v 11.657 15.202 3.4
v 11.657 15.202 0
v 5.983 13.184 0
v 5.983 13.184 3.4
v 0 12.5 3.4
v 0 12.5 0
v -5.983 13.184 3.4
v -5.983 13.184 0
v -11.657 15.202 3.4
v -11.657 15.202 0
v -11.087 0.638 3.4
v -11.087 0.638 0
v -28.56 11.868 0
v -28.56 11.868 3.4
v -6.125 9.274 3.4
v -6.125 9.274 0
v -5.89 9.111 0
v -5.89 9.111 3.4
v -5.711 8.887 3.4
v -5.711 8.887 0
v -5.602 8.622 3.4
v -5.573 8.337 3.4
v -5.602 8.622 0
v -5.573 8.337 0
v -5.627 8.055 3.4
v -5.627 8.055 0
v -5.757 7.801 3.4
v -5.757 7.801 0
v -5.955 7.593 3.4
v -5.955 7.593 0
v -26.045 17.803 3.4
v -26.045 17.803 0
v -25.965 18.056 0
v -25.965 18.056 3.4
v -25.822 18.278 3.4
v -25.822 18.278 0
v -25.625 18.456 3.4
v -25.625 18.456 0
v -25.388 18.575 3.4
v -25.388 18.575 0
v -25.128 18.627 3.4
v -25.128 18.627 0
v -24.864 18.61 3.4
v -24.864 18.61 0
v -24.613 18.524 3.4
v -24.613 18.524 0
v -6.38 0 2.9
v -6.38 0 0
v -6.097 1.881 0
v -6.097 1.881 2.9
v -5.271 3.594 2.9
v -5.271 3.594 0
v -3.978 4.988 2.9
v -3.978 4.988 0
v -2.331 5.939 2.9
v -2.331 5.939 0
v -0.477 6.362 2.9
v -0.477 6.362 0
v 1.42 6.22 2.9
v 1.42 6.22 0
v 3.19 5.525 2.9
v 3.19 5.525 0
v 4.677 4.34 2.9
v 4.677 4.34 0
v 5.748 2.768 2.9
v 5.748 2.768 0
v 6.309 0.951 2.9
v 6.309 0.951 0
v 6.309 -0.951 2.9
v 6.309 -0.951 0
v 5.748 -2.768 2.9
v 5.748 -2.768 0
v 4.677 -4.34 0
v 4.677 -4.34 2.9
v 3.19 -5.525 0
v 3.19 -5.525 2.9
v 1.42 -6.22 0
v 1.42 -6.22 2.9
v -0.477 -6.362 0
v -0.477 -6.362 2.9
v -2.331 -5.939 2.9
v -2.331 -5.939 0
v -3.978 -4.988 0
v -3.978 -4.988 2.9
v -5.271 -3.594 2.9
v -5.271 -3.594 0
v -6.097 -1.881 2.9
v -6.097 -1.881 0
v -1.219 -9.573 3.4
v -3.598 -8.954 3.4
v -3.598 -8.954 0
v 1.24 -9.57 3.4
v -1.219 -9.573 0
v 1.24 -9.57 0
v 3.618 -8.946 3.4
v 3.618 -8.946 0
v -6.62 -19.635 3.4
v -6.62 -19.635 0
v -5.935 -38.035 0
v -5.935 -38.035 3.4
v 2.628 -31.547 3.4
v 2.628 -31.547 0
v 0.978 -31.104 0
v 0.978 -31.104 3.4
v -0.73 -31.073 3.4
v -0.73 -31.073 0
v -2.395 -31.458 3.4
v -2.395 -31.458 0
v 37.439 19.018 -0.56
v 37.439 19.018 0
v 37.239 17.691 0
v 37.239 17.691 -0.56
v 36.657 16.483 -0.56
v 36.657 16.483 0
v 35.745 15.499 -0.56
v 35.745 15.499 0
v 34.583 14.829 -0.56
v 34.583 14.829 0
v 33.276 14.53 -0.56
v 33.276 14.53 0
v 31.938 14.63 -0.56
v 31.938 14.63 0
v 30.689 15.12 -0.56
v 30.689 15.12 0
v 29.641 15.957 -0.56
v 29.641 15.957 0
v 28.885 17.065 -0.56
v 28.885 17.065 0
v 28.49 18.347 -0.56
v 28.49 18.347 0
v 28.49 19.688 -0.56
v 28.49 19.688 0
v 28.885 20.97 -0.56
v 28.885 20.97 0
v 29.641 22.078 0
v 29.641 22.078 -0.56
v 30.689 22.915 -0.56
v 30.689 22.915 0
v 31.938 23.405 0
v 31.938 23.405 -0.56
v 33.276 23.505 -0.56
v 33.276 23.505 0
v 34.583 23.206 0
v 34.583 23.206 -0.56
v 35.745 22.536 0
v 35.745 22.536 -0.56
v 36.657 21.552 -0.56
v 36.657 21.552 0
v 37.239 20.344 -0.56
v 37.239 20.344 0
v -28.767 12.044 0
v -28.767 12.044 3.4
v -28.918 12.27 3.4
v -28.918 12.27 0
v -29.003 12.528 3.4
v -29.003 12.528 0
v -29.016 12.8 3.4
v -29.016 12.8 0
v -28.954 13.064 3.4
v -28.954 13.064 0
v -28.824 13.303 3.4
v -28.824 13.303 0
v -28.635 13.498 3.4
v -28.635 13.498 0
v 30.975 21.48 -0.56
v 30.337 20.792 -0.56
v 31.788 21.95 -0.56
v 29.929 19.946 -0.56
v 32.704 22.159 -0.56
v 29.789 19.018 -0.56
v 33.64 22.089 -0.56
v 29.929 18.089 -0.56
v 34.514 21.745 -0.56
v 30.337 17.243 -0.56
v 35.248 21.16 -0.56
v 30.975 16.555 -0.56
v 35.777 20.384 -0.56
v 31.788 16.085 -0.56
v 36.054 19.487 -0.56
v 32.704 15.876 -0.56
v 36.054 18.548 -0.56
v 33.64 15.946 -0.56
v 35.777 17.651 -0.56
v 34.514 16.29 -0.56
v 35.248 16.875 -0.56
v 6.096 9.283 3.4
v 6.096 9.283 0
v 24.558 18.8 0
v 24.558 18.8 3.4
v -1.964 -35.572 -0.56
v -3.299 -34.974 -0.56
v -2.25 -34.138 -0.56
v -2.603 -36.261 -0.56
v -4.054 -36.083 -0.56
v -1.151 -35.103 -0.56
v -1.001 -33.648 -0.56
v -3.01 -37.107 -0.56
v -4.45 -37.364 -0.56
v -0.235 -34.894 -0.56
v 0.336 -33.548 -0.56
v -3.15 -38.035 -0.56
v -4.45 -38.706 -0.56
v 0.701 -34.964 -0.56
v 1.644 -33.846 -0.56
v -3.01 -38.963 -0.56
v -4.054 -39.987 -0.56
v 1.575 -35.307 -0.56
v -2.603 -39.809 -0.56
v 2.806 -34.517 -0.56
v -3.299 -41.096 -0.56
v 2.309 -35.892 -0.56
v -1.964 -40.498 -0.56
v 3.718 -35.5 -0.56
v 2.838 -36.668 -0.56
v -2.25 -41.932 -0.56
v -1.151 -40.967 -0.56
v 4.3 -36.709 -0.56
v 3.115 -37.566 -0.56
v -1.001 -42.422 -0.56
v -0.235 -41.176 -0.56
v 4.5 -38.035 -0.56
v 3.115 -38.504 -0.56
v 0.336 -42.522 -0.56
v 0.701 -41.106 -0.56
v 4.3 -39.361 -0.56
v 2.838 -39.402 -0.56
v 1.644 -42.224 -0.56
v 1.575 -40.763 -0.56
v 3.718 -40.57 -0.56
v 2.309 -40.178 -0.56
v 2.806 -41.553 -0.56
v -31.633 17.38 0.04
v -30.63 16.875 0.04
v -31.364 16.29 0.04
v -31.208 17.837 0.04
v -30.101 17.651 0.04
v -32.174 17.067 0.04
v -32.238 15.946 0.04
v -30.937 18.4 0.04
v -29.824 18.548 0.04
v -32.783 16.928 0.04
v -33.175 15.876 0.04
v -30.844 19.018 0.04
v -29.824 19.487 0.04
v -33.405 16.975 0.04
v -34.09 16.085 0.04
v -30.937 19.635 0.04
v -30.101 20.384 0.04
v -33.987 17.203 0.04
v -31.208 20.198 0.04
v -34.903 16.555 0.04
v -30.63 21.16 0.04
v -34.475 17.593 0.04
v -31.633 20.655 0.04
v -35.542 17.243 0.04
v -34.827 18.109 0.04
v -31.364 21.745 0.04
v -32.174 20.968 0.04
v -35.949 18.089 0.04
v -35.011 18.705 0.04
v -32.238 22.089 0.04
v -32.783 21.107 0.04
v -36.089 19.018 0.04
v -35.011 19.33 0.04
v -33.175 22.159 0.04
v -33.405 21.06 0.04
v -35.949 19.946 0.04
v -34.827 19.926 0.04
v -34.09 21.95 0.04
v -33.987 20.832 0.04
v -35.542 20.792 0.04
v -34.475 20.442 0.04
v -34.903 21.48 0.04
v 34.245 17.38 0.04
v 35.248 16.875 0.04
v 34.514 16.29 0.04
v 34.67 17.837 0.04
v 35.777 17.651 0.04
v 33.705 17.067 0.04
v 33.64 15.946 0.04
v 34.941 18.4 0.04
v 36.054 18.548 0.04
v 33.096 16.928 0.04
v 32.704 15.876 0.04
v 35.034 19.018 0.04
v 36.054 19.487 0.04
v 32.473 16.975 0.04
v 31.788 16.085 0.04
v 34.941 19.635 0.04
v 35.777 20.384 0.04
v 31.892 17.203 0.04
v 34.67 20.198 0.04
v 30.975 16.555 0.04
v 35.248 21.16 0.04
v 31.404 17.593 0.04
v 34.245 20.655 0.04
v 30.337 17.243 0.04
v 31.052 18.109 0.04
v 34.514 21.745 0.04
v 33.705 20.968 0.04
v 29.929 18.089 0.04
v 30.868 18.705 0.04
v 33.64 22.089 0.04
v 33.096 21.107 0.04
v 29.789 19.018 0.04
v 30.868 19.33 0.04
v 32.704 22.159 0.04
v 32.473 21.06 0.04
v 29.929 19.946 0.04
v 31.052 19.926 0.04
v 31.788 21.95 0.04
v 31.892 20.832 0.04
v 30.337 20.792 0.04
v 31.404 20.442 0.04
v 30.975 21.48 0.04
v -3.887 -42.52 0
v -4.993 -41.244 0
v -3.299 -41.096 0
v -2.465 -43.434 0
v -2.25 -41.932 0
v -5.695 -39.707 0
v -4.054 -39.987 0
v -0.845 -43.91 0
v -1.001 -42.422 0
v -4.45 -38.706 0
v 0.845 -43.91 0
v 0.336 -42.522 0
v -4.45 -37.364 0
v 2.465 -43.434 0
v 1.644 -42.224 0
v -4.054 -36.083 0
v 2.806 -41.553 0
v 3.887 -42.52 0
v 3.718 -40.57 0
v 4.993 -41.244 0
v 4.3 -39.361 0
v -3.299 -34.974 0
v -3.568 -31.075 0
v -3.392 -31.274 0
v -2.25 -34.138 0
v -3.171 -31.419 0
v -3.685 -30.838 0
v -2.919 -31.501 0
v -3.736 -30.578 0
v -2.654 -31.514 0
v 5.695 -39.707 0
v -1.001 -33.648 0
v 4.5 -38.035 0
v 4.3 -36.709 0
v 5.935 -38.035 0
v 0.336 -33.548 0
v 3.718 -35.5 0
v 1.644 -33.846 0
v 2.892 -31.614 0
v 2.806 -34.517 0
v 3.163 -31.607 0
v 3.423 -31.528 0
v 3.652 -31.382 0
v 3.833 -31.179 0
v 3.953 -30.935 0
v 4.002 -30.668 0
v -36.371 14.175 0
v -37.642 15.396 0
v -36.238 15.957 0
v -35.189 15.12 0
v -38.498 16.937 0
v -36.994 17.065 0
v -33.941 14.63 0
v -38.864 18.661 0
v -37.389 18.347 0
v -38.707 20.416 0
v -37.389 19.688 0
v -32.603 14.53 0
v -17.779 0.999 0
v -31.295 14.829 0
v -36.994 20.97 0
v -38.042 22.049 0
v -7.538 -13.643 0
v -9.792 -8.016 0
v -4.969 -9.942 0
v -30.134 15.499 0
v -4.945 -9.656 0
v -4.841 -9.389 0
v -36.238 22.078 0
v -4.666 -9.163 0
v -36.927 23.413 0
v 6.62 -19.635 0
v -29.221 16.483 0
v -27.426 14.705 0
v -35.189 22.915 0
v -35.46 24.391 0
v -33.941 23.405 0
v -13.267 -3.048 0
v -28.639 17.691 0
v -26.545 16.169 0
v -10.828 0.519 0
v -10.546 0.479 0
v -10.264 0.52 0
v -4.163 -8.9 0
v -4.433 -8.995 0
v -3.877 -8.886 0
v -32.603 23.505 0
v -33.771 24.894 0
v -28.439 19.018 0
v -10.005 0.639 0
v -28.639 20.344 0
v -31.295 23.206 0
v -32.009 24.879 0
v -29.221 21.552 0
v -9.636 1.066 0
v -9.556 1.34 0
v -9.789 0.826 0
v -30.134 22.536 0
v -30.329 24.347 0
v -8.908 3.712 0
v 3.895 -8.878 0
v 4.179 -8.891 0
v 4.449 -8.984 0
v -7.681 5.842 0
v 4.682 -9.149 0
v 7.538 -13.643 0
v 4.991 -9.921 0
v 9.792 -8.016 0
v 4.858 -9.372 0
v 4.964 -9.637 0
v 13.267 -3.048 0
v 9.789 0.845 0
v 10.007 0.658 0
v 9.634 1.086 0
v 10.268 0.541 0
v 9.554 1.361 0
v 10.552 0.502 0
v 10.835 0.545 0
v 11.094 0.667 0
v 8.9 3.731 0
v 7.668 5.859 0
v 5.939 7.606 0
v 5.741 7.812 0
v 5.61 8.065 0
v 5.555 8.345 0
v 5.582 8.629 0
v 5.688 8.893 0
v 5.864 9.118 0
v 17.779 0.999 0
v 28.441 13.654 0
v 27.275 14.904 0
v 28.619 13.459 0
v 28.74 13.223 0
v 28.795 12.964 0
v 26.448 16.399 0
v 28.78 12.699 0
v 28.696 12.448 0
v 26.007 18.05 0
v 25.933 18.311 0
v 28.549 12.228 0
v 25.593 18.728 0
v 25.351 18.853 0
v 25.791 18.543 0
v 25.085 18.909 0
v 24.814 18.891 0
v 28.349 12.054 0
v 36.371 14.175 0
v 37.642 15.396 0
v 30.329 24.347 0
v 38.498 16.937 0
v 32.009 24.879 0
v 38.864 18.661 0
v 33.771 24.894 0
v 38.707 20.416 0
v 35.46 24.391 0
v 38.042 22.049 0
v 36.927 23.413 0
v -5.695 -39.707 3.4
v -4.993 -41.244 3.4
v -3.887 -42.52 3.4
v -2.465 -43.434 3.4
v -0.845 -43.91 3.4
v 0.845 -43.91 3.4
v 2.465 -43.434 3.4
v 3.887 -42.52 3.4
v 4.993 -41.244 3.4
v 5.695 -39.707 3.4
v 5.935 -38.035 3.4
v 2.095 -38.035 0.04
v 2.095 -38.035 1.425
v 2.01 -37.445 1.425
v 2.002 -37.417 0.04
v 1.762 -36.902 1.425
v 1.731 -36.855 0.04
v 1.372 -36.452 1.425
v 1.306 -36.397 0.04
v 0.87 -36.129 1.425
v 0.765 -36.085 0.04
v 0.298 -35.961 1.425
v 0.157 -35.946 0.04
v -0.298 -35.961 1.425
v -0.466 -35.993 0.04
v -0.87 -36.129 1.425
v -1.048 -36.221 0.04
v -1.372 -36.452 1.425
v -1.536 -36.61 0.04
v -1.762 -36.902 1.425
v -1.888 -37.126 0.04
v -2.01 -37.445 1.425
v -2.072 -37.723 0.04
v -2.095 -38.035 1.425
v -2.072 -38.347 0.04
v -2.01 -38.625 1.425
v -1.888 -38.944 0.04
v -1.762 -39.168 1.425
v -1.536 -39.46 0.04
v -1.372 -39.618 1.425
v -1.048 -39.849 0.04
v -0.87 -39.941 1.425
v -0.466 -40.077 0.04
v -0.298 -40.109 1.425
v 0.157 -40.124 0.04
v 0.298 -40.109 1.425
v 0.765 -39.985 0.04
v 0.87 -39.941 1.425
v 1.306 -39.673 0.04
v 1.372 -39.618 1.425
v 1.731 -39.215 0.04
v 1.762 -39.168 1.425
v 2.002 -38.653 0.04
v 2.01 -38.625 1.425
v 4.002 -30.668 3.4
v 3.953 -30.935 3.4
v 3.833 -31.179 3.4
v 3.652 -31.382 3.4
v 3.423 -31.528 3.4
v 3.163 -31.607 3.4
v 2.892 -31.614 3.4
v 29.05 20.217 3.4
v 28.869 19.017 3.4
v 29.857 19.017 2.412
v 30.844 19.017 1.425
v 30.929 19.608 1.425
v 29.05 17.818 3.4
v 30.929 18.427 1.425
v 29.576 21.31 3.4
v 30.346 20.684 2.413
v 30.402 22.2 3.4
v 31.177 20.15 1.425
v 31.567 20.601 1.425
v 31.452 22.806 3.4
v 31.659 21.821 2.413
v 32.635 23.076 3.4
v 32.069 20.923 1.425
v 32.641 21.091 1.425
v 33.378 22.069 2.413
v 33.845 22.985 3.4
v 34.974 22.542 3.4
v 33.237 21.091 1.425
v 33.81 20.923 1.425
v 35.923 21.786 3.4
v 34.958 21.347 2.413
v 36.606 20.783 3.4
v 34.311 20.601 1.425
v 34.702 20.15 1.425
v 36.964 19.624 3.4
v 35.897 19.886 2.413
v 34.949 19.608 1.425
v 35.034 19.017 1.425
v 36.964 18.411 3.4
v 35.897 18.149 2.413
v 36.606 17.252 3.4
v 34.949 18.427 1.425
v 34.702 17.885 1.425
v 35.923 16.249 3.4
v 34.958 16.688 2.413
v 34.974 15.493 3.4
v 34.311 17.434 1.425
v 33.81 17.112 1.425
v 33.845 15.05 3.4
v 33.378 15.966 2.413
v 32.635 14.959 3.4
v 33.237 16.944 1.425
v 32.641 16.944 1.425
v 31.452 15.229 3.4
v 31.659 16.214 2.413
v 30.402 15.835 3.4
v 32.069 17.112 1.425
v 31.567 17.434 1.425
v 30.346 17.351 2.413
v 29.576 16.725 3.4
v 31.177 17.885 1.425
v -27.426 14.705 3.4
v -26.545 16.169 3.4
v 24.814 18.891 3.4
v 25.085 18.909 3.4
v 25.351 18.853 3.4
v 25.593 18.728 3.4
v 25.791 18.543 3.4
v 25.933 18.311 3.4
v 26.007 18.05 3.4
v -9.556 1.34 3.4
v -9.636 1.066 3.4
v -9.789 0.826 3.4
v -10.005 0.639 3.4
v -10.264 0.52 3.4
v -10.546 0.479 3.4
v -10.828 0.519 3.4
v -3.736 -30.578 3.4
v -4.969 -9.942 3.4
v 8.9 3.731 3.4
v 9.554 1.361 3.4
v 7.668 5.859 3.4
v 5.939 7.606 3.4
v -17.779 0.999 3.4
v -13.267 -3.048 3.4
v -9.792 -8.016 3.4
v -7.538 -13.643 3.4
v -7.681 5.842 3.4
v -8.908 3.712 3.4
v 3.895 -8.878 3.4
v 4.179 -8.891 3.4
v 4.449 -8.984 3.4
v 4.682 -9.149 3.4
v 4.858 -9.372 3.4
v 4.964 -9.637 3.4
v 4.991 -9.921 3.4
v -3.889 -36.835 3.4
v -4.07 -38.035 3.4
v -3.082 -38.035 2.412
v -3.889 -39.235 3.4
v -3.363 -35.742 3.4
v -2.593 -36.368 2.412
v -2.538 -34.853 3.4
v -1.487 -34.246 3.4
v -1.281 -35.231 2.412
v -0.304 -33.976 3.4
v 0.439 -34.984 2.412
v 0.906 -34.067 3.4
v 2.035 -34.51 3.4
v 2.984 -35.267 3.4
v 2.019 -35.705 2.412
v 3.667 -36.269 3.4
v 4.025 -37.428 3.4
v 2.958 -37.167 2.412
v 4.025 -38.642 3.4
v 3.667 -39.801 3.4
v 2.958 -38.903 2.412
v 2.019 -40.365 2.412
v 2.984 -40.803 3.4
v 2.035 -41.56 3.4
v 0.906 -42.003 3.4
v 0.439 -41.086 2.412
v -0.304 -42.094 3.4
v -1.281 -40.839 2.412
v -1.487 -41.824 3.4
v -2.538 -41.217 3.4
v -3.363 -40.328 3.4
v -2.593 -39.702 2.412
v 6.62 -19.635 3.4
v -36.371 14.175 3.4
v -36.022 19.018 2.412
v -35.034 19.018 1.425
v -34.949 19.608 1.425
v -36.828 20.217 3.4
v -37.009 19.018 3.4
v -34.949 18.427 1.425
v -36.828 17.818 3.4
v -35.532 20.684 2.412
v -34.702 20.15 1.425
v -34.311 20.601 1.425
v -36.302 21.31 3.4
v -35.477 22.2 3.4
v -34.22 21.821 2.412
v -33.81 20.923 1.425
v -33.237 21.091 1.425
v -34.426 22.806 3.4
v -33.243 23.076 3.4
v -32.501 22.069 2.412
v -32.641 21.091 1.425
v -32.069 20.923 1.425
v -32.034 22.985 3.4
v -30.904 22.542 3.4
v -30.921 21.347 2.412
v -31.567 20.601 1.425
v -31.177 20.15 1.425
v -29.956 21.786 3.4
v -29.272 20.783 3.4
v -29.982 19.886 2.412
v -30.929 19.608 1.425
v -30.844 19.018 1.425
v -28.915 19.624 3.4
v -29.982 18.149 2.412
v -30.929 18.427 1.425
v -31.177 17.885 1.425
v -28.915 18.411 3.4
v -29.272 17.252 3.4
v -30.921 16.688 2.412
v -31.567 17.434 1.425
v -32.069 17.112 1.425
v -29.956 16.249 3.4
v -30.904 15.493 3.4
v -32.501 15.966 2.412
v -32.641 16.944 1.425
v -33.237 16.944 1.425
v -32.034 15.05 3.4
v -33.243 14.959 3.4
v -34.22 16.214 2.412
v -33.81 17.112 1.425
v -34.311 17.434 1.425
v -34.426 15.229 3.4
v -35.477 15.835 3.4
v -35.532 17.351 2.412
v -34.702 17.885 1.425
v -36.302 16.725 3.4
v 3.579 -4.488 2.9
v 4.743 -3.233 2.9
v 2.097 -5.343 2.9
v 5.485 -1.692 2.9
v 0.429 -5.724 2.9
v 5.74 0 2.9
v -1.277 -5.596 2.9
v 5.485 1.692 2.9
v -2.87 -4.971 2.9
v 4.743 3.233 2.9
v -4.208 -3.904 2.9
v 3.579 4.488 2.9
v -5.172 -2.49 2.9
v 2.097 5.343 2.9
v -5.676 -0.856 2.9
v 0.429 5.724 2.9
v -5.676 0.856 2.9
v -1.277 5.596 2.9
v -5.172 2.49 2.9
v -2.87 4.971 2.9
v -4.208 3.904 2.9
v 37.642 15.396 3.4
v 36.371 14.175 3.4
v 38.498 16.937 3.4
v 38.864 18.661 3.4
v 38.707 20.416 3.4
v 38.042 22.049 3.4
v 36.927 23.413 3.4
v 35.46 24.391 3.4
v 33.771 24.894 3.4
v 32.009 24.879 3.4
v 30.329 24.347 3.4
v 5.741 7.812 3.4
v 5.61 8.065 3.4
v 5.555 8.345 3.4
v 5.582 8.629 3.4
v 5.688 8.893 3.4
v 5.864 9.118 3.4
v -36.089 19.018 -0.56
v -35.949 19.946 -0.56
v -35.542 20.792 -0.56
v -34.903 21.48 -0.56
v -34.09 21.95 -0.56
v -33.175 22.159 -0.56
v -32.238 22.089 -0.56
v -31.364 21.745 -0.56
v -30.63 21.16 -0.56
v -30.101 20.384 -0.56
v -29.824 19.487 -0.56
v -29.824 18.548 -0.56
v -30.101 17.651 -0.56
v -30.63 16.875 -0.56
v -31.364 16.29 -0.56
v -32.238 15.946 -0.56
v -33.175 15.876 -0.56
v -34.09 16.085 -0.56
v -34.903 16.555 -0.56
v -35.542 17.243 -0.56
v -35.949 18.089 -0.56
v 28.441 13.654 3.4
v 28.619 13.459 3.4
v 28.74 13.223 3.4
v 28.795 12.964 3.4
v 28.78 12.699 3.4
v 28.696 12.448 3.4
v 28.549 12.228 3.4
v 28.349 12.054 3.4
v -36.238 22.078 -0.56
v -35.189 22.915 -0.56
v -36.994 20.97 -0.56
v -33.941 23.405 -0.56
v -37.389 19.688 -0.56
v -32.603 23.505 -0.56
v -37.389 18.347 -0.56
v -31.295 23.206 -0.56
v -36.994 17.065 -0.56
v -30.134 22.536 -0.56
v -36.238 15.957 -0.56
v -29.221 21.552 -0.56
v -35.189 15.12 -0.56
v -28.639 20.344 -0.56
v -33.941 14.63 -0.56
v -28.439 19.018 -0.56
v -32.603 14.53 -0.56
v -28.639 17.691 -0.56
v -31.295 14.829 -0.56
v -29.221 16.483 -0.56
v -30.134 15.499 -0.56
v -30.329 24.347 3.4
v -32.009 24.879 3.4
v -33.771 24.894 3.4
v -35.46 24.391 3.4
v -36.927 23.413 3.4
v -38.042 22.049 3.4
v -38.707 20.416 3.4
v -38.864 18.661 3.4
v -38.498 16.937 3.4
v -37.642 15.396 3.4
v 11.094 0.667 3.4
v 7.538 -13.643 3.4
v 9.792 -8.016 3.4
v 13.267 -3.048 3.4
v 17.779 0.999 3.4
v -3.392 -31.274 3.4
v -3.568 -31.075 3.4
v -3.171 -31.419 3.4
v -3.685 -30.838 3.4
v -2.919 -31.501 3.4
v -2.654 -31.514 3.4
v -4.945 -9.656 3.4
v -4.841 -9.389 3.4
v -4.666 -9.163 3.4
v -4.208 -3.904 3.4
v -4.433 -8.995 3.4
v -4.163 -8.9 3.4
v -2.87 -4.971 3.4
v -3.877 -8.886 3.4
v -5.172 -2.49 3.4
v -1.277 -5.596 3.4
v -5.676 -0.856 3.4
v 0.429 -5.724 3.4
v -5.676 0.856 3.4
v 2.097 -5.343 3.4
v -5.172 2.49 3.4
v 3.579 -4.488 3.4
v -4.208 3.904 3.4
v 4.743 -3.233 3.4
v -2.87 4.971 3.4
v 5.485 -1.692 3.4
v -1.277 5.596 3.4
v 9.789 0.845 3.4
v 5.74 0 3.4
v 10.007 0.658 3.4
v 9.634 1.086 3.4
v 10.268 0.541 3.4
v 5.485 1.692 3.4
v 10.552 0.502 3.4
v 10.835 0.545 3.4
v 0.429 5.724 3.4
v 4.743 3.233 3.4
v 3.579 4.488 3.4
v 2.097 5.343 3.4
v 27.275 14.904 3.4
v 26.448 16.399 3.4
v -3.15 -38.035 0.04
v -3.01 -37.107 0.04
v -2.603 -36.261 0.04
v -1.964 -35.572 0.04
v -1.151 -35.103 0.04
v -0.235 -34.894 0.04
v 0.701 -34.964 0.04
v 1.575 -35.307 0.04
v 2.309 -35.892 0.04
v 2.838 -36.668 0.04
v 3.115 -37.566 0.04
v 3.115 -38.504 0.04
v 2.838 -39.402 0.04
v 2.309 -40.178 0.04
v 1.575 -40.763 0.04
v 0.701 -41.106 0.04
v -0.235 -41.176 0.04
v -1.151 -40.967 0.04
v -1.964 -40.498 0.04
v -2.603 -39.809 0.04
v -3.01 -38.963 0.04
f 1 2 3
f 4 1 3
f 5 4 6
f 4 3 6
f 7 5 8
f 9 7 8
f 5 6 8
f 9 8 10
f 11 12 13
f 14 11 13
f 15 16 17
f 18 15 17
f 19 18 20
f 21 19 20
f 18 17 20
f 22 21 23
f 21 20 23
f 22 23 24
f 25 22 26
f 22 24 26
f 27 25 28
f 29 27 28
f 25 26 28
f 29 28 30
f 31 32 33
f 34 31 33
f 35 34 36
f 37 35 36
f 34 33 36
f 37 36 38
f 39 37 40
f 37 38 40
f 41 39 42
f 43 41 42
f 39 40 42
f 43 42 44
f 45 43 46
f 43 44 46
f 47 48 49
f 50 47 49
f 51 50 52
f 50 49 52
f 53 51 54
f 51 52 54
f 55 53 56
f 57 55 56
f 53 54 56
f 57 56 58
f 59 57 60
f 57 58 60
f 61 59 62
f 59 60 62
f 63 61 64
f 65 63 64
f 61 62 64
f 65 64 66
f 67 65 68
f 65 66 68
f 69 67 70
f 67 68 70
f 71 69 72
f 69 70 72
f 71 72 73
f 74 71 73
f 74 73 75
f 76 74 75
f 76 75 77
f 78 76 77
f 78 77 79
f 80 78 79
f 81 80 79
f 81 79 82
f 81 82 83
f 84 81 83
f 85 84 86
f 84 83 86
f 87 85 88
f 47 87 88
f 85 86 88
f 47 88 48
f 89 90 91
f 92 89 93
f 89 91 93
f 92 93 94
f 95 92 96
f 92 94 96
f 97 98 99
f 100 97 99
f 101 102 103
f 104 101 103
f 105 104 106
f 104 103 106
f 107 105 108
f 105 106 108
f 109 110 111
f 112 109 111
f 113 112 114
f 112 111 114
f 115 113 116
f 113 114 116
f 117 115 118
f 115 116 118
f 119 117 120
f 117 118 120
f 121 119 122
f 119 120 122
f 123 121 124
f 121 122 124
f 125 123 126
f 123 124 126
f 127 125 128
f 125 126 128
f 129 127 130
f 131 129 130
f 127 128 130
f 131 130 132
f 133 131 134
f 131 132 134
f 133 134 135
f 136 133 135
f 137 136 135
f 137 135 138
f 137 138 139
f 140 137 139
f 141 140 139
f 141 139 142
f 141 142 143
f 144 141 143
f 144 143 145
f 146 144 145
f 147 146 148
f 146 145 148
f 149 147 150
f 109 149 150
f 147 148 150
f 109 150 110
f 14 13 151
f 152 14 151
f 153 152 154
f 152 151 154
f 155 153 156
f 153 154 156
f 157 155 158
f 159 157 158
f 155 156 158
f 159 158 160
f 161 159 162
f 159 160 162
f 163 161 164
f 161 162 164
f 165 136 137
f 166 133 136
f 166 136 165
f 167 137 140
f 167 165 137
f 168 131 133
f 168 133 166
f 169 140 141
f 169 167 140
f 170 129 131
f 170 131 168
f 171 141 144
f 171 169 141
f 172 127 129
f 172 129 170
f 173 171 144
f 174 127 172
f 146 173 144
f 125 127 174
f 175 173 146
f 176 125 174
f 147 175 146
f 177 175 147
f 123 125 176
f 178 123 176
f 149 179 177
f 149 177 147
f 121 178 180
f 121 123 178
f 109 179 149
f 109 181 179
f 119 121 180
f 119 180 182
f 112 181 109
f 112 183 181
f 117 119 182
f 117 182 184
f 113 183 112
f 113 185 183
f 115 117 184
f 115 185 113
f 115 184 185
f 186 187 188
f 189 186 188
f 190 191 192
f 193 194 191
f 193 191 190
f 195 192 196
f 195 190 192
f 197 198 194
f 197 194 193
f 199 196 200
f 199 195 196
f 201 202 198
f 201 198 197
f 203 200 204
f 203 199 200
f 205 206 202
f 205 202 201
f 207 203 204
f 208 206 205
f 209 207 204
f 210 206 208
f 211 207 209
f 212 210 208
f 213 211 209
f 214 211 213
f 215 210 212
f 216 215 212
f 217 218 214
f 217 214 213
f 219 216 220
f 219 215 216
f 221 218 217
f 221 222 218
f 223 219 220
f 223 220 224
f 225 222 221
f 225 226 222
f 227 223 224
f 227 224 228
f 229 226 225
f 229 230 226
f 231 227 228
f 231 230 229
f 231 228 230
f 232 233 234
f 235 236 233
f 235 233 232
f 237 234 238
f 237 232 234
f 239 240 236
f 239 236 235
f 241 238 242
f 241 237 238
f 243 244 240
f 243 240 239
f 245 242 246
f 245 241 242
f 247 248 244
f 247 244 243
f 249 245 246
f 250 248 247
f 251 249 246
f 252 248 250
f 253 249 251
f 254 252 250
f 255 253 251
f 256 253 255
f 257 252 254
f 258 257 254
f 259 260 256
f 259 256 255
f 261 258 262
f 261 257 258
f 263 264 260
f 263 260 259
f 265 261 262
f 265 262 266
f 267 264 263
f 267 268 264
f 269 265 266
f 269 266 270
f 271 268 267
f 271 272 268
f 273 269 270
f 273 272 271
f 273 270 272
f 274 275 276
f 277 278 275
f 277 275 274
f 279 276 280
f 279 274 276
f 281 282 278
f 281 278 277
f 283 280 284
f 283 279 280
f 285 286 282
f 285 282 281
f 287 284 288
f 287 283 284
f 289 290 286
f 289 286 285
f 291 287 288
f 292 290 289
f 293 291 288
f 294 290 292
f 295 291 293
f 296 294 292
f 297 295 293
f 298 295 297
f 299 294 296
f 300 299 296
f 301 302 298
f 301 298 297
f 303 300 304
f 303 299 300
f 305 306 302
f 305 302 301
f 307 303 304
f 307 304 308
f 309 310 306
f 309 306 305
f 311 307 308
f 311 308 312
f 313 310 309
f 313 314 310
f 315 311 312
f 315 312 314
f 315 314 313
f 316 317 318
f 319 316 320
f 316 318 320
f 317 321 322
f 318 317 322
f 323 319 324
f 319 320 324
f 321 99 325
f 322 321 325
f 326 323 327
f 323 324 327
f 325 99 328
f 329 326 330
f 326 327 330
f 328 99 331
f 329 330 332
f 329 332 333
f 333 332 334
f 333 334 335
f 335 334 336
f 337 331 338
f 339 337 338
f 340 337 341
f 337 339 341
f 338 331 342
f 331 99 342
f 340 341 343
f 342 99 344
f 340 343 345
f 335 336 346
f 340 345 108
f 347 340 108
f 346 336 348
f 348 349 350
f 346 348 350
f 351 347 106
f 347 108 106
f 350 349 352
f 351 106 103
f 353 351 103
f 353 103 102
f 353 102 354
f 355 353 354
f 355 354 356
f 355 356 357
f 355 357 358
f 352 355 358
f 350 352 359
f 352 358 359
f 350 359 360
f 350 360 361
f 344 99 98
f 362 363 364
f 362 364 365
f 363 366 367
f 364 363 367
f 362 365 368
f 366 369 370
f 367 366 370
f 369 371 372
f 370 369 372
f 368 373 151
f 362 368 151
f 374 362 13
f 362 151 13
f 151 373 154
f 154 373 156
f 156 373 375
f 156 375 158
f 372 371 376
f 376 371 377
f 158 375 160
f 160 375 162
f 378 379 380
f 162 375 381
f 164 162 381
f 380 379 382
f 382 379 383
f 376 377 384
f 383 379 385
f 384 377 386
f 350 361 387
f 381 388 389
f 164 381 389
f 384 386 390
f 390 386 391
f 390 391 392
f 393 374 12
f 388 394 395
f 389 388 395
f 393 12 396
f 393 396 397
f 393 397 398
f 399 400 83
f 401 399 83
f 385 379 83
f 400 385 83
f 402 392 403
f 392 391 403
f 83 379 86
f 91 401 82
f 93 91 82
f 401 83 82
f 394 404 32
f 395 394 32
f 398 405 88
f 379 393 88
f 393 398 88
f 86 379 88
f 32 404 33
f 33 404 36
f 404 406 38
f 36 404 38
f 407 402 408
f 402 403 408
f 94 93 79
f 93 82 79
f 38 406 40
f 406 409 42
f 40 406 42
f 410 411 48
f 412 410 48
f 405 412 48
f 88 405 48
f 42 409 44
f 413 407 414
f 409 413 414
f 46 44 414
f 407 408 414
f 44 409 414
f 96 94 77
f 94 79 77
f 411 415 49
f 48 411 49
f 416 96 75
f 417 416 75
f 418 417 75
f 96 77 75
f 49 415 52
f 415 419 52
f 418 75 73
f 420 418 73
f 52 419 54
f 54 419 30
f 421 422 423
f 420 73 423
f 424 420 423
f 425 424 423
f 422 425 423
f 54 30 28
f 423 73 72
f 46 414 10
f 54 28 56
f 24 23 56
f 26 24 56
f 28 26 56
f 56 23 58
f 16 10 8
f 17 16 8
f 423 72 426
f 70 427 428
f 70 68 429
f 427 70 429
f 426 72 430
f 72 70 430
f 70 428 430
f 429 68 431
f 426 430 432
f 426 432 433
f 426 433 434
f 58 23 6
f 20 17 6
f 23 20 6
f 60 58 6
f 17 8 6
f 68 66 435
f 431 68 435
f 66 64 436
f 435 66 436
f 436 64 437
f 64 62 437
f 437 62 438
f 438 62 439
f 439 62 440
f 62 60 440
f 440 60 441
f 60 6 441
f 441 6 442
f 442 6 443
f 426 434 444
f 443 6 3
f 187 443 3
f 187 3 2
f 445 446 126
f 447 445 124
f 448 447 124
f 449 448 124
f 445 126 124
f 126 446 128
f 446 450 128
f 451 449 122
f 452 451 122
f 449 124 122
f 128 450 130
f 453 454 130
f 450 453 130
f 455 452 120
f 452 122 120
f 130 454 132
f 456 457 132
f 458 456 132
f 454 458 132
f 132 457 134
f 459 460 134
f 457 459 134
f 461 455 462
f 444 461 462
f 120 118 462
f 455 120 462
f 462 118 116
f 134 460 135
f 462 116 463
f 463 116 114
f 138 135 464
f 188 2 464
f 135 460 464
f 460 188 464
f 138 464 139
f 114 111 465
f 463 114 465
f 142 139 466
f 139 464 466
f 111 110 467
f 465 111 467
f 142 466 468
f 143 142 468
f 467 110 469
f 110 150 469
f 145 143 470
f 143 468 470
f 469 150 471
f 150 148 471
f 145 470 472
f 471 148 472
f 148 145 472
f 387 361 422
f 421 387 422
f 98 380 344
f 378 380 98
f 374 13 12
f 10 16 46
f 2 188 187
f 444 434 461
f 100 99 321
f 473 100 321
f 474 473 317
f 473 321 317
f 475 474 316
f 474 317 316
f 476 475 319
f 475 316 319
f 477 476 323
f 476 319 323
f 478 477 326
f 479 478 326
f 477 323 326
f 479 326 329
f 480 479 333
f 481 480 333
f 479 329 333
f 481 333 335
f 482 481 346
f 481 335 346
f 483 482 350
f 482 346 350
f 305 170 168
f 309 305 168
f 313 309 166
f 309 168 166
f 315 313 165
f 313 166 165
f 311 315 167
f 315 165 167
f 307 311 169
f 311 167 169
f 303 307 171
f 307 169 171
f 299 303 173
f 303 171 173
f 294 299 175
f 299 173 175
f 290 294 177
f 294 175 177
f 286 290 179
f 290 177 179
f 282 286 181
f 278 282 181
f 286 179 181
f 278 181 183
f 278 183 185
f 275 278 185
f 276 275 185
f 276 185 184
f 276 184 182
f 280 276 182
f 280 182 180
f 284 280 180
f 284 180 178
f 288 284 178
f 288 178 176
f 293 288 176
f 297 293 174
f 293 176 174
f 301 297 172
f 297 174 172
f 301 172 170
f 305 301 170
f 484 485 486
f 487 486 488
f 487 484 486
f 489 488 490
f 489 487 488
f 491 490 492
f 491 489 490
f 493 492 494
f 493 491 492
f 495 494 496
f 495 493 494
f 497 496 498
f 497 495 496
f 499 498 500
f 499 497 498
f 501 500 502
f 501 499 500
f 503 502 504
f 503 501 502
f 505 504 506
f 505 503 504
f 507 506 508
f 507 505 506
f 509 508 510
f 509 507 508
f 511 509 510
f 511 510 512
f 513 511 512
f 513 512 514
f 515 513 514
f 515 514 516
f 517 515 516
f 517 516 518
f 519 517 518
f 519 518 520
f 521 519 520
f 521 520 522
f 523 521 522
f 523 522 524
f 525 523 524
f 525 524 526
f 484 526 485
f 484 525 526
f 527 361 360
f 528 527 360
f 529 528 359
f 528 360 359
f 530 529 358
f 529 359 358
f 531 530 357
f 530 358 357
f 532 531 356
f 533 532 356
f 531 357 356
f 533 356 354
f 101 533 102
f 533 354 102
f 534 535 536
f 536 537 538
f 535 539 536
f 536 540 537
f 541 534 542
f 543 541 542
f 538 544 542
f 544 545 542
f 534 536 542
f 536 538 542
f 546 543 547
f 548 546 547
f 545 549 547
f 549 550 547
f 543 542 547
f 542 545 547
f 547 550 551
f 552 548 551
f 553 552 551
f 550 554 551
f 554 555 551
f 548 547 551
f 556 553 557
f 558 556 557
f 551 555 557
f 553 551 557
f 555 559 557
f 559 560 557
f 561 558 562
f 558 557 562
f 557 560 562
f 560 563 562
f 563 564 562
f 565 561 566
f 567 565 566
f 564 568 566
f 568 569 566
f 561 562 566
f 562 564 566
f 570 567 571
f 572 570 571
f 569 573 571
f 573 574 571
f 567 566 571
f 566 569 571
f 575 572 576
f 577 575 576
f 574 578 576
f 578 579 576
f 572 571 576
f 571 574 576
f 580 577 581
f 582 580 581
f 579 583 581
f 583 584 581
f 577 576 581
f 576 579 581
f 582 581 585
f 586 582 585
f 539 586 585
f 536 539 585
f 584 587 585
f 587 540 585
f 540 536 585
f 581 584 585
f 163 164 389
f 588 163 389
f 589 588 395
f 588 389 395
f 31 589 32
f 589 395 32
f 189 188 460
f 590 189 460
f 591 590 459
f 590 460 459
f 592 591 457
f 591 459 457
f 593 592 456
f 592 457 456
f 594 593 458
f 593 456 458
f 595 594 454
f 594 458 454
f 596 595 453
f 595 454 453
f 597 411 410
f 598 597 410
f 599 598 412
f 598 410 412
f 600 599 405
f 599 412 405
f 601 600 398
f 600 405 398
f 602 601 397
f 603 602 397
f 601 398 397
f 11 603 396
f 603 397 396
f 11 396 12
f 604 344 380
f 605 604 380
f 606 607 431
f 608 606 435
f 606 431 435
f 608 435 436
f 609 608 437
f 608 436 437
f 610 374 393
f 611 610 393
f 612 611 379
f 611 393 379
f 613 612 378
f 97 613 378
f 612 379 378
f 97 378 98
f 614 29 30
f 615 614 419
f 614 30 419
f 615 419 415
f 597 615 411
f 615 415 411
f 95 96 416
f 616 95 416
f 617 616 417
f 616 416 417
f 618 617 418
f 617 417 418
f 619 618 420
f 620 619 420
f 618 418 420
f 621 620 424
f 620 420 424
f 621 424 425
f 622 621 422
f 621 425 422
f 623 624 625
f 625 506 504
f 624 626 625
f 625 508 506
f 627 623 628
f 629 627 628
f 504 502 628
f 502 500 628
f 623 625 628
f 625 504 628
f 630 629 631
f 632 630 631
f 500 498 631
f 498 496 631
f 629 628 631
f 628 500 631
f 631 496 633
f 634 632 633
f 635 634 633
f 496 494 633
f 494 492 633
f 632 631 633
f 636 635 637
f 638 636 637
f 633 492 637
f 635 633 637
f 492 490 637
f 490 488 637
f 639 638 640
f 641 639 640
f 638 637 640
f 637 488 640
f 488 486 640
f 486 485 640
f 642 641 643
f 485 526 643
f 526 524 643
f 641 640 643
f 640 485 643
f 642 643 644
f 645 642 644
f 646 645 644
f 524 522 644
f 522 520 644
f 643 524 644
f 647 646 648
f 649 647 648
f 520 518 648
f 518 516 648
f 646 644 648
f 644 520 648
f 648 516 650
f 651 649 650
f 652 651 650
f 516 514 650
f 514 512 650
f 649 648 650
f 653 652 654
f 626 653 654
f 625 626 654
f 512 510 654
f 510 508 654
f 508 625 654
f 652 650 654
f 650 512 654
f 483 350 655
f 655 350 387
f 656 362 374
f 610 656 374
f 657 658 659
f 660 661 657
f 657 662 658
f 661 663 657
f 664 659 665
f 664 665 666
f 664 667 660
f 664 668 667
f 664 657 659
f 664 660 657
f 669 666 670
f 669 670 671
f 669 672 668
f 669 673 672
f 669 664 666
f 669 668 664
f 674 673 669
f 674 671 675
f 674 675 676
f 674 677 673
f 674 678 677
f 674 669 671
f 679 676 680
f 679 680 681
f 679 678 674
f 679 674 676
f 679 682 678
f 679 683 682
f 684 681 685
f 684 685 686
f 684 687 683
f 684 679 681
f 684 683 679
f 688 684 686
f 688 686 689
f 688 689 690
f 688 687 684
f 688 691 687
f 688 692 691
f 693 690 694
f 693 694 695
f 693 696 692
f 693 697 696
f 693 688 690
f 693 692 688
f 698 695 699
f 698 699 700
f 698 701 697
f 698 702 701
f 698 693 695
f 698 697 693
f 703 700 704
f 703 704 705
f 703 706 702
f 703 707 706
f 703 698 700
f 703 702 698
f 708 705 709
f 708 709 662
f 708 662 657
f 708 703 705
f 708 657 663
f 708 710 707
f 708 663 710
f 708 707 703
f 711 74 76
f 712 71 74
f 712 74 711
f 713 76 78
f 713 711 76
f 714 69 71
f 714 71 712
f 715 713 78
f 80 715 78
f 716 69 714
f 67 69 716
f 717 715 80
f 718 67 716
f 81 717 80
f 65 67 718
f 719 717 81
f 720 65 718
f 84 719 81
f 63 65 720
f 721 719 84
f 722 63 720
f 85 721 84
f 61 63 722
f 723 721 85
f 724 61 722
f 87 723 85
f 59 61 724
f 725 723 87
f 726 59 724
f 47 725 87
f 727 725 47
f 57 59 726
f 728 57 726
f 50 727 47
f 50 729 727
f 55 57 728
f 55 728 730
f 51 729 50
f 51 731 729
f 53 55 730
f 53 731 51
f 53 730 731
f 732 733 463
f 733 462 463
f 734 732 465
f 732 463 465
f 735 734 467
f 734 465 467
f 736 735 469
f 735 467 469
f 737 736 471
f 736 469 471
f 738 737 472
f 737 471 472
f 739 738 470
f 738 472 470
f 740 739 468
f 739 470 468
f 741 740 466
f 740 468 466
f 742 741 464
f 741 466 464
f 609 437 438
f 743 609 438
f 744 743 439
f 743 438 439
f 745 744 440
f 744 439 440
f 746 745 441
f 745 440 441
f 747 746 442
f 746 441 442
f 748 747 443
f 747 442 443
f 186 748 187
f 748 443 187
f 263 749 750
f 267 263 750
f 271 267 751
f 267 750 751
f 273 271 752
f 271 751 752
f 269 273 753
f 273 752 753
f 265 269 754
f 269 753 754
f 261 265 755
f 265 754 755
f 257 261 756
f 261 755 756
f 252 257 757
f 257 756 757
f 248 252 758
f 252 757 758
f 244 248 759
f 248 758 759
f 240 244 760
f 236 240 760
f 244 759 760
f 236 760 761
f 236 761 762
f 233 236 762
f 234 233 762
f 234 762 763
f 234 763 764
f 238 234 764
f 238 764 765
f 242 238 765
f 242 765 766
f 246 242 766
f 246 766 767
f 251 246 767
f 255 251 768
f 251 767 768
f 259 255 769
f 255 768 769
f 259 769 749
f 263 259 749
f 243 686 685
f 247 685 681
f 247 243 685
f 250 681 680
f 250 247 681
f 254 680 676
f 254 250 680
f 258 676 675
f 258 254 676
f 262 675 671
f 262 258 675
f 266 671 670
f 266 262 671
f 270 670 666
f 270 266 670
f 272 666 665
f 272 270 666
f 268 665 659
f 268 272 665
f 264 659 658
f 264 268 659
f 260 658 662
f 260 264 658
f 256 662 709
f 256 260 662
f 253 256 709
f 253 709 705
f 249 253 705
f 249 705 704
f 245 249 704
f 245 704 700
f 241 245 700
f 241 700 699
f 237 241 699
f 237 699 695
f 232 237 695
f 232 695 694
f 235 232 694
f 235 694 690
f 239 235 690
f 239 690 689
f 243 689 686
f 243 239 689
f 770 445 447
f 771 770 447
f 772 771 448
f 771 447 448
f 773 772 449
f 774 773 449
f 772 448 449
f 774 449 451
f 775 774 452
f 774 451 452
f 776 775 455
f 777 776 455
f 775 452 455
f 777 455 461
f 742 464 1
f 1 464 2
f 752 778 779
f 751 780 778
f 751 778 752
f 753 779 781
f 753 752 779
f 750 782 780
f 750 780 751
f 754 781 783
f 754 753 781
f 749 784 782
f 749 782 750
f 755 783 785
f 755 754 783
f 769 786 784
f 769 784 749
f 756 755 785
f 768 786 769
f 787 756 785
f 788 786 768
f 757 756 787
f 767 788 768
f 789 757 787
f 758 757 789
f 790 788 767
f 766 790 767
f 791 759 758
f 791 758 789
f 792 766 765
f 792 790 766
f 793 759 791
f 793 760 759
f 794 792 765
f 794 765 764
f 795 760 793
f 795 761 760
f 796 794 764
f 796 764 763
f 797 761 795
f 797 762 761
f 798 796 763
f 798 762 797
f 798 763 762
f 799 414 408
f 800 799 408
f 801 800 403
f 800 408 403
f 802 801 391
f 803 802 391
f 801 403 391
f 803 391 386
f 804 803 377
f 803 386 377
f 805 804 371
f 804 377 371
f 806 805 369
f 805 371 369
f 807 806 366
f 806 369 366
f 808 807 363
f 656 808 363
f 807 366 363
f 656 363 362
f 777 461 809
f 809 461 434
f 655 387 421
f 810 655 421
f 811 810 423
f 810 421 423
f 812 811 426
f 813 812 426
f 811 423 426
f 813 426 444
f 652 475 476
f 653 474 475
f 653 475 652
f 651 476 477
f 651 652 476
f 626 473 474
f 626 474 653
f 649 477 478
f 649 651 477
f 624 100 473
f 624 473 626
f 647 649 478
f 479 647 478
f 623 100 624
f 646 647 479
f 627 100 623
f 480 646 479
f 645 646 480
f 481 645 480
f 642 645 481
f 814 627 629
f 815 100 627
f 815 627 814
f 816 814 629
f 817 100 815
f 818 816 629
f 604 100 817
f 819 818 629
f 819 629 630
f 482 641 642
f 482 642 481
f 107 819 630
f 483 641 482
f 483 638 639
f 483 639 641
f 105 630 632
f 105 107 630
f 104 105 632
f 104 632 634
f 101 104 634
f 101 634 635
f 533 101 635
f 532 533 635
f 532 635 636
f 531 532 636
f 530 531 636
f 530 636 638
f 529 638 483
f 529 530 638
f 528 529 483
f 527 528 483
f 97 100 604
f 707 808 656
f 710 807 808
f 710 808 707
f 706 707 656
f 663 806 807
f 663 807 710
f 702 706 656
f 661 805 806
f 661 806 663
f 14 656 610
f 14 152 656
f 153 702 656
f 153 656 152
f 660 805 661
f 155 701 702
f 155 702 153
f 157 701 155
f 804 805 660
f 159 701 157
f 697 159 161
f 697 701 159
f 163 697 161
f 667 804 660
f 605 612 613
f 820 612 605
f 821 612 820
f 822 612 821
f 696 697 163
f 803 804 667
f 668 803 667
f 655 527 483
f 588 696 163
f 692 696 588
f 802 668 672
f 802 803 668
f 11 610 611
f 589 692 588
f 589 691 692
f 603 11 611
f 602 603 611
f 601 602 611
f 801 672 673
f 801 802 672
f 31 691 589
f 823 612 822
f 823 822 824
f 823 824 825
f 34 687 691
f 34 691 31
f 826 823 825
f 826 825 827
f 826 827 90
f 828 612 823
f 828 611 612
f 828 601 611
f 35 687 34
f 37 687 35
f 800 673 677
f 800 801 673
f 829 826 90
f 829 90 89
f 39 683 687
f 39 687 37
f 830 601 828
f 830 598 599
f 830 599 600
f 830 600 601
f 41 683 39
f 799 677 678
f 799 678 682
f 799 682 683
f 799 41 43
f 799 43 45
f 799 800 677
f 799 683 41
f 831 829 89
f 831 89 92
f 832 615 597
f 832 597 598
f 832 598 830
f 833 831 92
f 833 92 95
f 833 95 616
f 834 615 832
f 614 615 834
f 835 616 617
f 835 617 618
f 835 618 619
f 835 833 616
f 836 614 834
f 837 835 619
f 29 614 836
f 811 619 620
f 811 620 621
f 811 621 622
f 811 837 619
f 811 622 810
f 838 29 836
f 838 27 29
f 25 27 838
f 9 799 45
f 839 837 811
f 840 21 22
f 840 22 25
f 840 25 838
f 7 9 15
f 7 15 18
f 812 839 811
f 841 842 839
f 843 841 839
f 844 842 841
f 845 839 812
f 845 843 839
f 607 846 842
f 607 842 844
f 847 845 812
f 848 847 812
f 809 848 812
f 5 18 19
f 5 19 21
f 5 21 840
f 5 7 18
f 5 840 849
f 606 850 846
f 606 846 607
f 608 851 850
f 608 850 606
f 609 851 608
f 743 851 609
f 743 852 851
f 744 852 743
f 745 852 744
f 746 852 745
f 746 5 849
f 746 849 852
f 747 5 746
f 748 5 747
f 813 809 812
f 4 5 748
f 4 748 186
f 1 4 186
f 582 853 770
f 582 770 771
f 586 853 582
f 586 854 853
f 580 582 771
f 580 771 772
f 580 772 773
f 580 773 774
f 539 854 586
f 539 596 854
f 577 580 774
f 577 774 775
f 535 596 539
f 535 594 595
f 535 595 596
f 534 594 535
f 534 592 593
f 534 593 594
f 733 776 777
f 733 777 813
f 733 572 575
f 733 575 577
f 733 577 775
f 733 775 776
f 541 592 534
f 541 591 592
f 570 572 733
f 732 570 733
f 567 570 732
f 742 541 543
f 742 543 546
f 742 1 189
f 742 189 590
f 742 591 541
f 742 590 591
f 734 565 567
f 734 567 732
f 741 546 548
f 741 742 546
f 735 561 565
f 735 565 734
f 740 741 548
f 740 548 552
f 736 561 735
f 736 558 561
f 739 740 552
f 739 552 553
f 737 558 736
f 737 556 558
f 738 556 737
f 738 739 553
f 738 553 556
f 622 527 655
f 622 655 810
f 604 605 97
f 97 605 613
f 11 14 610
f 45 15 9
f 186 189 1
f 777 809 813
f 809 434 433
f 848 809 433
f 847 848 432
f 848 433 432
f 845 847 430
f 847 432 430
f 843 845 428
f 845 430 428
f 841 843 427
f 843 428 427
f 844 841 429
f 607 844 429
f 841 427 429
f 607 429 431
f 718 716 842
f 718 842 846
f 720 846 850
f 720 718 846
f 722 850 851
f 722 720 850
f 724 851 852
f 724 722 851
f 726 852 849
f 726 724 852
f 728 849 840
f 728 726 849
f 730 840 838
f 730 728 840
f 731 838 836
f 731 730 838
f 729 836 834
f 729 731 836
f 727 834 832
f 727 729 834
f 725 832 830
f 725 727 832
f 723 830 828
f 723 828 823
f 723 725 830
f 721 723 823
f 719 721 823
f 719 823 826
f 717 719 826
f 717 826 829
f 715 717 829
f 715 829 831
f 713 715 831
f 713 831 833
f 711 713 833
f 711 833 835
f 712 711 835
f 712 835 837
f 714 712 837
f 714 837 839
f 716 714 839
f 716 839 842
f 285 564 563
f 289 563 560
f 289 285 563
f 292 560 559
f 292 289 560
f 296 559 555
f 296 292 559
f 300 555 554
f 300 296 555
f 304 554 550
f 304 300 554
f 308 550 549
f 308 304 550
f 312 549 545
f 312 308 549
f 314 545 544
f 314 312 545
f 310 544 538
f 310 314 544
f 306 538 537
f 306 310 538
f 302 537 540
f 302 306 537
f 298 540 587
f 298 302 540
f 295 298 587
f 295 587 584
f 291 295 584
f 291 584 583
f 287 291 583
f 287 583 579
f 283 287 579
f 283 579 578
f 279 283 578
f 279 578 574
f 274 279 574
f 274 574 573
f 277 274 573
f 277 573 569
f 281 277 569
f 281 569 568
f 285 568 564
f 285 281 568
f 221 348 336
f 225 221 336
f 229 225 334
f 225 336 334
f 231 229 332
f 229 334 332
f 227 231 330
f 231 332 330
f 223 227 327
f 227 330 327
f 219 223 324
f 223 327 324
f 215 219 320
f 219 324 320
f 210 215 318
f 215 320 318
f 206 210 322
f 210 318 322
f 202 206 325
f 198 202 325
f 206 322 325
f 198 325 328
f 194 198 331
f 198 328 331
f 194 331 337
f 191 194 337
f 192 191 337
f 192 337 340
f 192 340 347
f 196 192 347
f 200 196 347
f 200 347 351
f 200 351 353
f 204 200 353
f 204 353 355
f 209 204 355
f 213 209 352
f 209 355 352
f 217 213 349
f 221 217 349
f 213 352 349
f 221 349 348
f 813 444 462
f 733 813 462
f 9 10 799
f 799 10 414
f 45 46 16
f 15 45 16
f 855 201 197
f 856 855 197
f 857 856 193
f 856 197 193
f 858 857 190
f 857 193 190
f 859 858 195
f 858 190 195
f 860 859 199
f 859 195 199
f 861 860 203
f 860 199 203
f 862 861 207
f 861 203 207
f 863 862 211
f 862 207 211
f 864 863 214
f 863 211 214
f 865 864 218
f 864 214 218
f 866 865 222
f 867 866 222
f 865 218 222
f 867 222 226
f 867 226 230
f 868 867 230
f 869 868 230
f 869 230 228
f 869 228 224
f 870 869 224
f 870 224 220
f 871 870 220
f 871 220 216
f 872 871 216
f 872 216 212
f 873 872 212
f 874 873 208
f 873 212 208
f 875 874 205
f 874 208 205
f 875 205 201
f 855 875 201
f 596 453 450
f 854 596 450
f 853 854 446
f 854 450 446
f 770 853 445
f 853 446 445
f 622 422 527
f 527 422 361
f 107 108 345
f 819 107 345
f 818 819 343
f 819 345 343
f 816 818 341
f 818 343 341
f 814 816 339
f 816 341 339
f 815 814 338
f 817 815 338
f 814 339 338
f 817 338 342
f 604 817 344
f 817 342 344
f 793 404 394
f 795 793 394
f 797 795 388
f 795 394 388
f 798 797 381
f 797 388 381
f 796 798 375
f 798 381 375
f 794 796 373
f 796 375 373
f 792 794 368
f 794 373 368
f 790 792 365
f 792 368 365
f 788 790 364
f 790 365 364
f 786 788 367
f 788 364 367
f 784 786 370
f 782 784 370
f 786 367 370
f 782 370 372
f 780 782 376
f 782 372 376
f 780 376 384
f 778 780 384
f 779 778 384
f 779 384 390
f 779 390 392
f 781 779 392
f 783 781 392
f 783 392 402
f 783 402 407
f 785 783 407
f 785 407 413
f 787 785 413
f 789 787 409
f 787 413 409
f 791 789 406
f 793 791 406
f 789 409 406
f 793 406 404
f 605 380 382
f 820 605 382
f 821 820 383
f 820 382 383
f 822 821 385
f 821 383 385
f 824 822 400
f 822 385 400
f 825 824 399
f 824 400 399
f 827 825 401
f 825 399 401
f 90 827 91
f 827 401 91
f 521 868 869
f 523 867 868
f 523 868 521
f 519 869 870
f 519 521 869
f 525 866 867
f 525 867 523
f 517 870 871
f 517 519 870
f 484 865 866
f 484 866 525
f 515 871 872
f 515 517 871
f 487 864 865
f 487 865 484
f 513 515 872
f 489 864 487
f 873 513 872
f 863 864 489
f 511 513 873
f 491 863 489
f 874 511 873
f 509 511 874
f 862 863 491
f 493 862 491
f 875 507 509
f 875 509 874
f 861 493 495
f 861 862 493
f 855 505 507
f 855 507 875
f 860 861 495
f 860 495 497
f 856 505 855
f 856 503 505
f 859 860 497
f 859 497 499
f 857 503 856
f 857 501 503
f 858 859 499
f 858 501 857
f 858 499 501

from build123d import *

# Parameters (mm, degrees)
SKETCH_1_R          = 5.935
SKETCH_1_R_2        = 2.095
SKETCH_1_R_3        = 5.74
EXTRUDE_1_DEPTH     = 3.4
SKETCH_3_R          = 6.38
CUT_EXTRUDE_1_DEPTH = 2.9
SKETCH_4_R          = 4.5
EXTRUDE_3_DEPTH     = 0.56
SKETCH_6_R          = 3.15
CUT_EXTRUDE_2_DEPTH = 0.6
SKETCH_7_R          = 3.15
CUT_EXTRUDE_3_DEPTH = 0.6
SKETCH_8_R          = 3.15
CUT_EXTRUDE_4_DEPTH = 0.6
CUT_EXTRUDE_5_DEPTH = 10


with BuildPart() as part:
    # 草图1 → 凸台-拉伸1 (new body)
    # profile 1 of 4: a face of its own
    with BuildSketch(Plane.XY):
        with Locations((-32.939276233, 19.0175)):
            Circle(SKETCH_1_R)
        with Locations((-32.939276233, 19.0175)):
            Circle(SKETCH_1_R_2, mode=Mode.SUBTRACT)
    # profile 2 of 4: a face of its own
    with BuildSketch(Plane.XY):
        with Locations((32.939276233, 19.0175)):
            Circle(SKETCH_1_R)
        with Locations((32.939276233, 19.0175)):
            Circle(SKETCH_1_R_2, mode=Mode.SUBTRACT)
    # profile 3 of 4: a face of its own
    with BuildSketch(Plane.XY):
        with BuildLine():
            Line((-11.657112974, 15.201644655), (-30.328522818, 24.347433546))
            ThreePointArc((-30.328522818, 24.347433546), (-27.903452243, 22.158312274), (-27.004276233, 19.0175))
            ThreePointArc((-27.004276233, 19.0175), (-30.213751559, 13.745333439), (-36.370995778, 14.175235451))
            Line((-36.370995778, 14.175235451), (-17.779369394, 0.999324265))
            ThreePointArc((-17.779369394, 0.999324265), (-9.792356792, -8.015833705), (-6.620498611, -19.634988545))
            Line((-6.620498611, -19.634988545), (-5.935, -38.035))
            ThreePointArc((-5.935, -38.035), (0, -32.1), (5.935, -38.035))
            Line((5.935, -38.035), (6.620498611, -19.634988545))
            ThreePointArc((6.620498611, -19.634988545), (9.792356792, -8.015833705), (17.779369394, 0.999324265))
            Line((17.779369394, 0.999324265), (36.370995778, 14.175235451))
            ThreePointArc((36.370995778, 14.175235451), (27.836639672, 15.986439933), (30.328522818, 24.347433546))
            Line((30.328522818, 24.347433546), (11.657112974, 15.201644655))
            ThreePointArc((11.657112974, 15.201644655), (0, 12.5), (-11.657112974, 15.201644655))
        make_face()
        Circle(SKETCH_1_R_3, mode=Mode.SUBTRACT)
    # profile 4 of 4: a face of its own
    with BuildSketch(Plane.XY):
        with Locations((0, -38.035)):
            Circle(SKETCH_1_R)
        with Locations((0, -38.035)):
            Circle(SKETCH_1_R_2, mode=Mode.SUBTRACT)
    extrude(amount=EXTRUDE_1_DEPTH)

    # 草图3 → 切除-拉伸1 (cut)
    with BuildSketch(Plane(origin=(0, 0, 0), x_dir=(-1, 0, 0), z_dir=(0, 0, -1))):
        Circle(SKETCH_3_R)
    extrude(amount=-CUT_EXTRUDE_1_DEPTH, mode=Mode.SUBTRACT)

    # 草图4 → 凸台-拉伸3 (add)
    with BuildSketch(Plane(origin=(0, 0, 0), x_dir=(-1, 0, 0), z_dir=(0, 0, -1))):
        with Locations(Location((0, -38.035, 0), (0, 0, 180))):
            Circle(SKETCH_4_R)
        with Locations(Location((32.939276233, 19.0175, 0), (0, 0, 180))):
            Circle(SKETCH_4_R)
        with Locations(Location((-32.939276233, 19.0175, 0), (0, 0, 180))):
            Circle(SKETCH_4_R)
    extrude(amount=EXTRUDE_3_DEPTH)

    # 草图6 → 切除-拉伸2 (cut)
    with BuildSketch(Plane(origin=(0, 0, -0.56), x_dir=(-1, 0, 0), z_dir=(0, 0, -1))):
        with Locations((0, -38.035)):
            Circle(SKETCH_6_R)
    extrude(amount=-CUT_EXTRUDE_2_DEPTH, mode=Mode.SUBTRACT)

    # 草图7 → 切除-拉伸3 (cut)
    with BuildSketch(Plane(origin=(0, 0, -0.56), x_dir=(-1, 0, 0), z_dir=(0, 0, -1))):
        with Locations((-32.939276233, 19.0175)):
            Circle(SKETCH_7_R)
    extrude(amount=-CUT_EXTRUDE_3_DEPTH, mode=Mode.SUBTRACT)

    # 草图8 → 切除-拉伸4 (cut)
    with BuildSketch(Plane(origin=(0, 0, -0.56), x_dir=(-1, 0, 0), z_dir=(0, 0, -1))):
        with Locations((32.939276233, 19.0175)):
            Circle(SKETCH_8_R)
    extrude(amount=-CUT_EXTRUDE_4_DEPTH, mode=Mode.SUBTRACT)

    # 草图9 → 切除-旋转1 (revolve, cut)
    with BuildSketch(Plane(origin=(0, 19.0175, 0), x_dir=(-1, 0, 0), z_dir=(0, -1, 0))):
        Polygon((35.034276233, -3.4), (35.034276233, -1.425), (37.009276233, -3.4), align=None)
    revolve(axis=Axis((-32.939276233, 19.0175, 3.4), (0, 0, -1)), mode=Mode.SUBTRACT)

    # 草图10 → 切除-旋转2 (revolve, cut)
    with BuildSketch(Plane(origin=(16.469638116, -9.50875, 0), x_dir=(0, 0, 1), z_dir=(-0.8660254037844397, 0.49999999999999806, 0)), mode=Mode.PRIVATE) as cut_revolve_2_sk:
        Polygon((3.4, 35.034276233), (3.4, 37.009276233), (1.425, 35.034276233), align=None)
    revolve(cut_revolve_2_sk.sketch.rotate(Axis((32.939276233, 19.0175, 3.4), (0, 0, -1)), 240), axis=Axis((32.939276233, 19.0175, 3.4), (0, 0, -1)), mode=Mode.SUBTRACT)

    # 草图11 → 切除-旋转3 (revolve, cut)
    with BuildSketch(Plane(origin=(16.469638116, -9.50875, 0), x_dir=(0, 0, 1), z_dir=(-0.8660254037844397, 0.49999999999999806, 0)), mode=Mode.PRIVATE) as cut_revolve_3_sk:
        Polygon((3.4, -30.844276233), (3.4, -28.869276233), (1.425, -30.844276233), align=None)
    revolve(cut_revolve_3_sk.sketch.rotate(Axis((0, -38.035, 3.4), (0, 0, -1)), 240), axis=Axis((0, -38.035, 3.4), (0, 0, -1)), mode=Mode.SUBTRACT)

    # 草图12 → 切除-拉伸5 (cut)
    with BuildSketch(Plane(origin=(0, 0, 0), x_dir=(-1, 0, 0), z_dir=(0, 0, -1))):
        with BuildLine():
            Line((-4.991404318, -9.920918283), (-4.002436423, -30.667860961))
            ThreePointArc((-4.002436423, -30.667860961), (-3.542480946, -31.462610037), (-2.628124289, -31.547091036))
            ThreePointArc((-2.628124289, -31.547091036), (-0.124699507, -31.0361108), (2.395338905, -31.457587778))
            ThreePointArc((2.395338905, -31.457587778), (3.286322012, -31.353916504), (3.73574796, -30.577633728))
            Line((3.73574796, -30.577633728), (4.96942943, -9.941577808))
            ThreePointArc((4.96942943, -9.941577808), (4.555657168, -9.070468591), (3.598327924, -8.954023462))
            ThreePointArc((3.598327924, -8.954023462), (-0.010417716, -9.649994377), (-3.617652266, -8.946233402))
            ThreePointArc((-3.617652266, -8.946233402), (-4.57119236, -9.057730973), (-4.991404318, -9.920918283))
        make_face()
        with BuildLine():
            Line((-6.096065103, 9.283142082), (-24.55792846, 18.8001421))
            ThreePointArc((-24.55792846, 18.8001421), (-25.476179088, 18.79918351), (-26.006520108, 18.049567917))
            ThreePointArc((-26.006520108, 18.049567917), (-26.815710634, 15.626048341), (-28.44073961, 13.654369547))
            ThreePointArc((-28.44073961, 13.654369547), (-28.796449207, 12.830919904), (-28.348881576, 12.053564228))
            Line((-28.348881576, 12.053564228), (-11.09437365, 0.667136775))
            ThreePointArc((-11.09437365, 0.667136775), (-10.133084808, 0.589919457), (-9.553575746, 1.360768338))
            ThreePointArc((-9.553575746, 1.360768338), (-8.351931419, 4.834019195), (-5.938839262, 7.606095465))
            ThreePointArc((-5.938839262, 7.606095465), (-5.558628943, 8.487634196), (-6.096065103, 9.283142082))
        make_face()
        with BuildLine():
            Line((11.087469421, 0.637776201), (28.560364883, 11.867718861))
            ThreePointArc((28.560364883, 11.867718861), (29.018660034, 12.663426527), (28.634644397, 13.49752312))
            ThreePointArc((28.634644397, 13.49752312), (26.940410141, 15.410062459), (26.045400706, 17.803218231))
            ThreePointArc((26.045400706, 17.803218231), (25.510127195, 18.5229966), (24.613133616, 18.5240695))
            Line((24.613133616, 18.5240695), (6.12494422, 9.274441032))
            ThreePointArc((6.12494422, 9.274441032), (5.57742764, 8.480549134), (5.955247822, 7.593255124))
            ThreePointArc((5.955247822, 7.593255124), (8.362349135, 4.815975182), (9.556491527, 1.340137937))
            ThreePointArc((9.556491527, 1.340137937), (10.129821304, 0.570096777), (11.087469421, 0.637776201))
        make_face()
    extrude(amount=-CUT_EXTRUDE_5_DEPTH, mode=Mode.SUBTRACT)


solid = part.part
